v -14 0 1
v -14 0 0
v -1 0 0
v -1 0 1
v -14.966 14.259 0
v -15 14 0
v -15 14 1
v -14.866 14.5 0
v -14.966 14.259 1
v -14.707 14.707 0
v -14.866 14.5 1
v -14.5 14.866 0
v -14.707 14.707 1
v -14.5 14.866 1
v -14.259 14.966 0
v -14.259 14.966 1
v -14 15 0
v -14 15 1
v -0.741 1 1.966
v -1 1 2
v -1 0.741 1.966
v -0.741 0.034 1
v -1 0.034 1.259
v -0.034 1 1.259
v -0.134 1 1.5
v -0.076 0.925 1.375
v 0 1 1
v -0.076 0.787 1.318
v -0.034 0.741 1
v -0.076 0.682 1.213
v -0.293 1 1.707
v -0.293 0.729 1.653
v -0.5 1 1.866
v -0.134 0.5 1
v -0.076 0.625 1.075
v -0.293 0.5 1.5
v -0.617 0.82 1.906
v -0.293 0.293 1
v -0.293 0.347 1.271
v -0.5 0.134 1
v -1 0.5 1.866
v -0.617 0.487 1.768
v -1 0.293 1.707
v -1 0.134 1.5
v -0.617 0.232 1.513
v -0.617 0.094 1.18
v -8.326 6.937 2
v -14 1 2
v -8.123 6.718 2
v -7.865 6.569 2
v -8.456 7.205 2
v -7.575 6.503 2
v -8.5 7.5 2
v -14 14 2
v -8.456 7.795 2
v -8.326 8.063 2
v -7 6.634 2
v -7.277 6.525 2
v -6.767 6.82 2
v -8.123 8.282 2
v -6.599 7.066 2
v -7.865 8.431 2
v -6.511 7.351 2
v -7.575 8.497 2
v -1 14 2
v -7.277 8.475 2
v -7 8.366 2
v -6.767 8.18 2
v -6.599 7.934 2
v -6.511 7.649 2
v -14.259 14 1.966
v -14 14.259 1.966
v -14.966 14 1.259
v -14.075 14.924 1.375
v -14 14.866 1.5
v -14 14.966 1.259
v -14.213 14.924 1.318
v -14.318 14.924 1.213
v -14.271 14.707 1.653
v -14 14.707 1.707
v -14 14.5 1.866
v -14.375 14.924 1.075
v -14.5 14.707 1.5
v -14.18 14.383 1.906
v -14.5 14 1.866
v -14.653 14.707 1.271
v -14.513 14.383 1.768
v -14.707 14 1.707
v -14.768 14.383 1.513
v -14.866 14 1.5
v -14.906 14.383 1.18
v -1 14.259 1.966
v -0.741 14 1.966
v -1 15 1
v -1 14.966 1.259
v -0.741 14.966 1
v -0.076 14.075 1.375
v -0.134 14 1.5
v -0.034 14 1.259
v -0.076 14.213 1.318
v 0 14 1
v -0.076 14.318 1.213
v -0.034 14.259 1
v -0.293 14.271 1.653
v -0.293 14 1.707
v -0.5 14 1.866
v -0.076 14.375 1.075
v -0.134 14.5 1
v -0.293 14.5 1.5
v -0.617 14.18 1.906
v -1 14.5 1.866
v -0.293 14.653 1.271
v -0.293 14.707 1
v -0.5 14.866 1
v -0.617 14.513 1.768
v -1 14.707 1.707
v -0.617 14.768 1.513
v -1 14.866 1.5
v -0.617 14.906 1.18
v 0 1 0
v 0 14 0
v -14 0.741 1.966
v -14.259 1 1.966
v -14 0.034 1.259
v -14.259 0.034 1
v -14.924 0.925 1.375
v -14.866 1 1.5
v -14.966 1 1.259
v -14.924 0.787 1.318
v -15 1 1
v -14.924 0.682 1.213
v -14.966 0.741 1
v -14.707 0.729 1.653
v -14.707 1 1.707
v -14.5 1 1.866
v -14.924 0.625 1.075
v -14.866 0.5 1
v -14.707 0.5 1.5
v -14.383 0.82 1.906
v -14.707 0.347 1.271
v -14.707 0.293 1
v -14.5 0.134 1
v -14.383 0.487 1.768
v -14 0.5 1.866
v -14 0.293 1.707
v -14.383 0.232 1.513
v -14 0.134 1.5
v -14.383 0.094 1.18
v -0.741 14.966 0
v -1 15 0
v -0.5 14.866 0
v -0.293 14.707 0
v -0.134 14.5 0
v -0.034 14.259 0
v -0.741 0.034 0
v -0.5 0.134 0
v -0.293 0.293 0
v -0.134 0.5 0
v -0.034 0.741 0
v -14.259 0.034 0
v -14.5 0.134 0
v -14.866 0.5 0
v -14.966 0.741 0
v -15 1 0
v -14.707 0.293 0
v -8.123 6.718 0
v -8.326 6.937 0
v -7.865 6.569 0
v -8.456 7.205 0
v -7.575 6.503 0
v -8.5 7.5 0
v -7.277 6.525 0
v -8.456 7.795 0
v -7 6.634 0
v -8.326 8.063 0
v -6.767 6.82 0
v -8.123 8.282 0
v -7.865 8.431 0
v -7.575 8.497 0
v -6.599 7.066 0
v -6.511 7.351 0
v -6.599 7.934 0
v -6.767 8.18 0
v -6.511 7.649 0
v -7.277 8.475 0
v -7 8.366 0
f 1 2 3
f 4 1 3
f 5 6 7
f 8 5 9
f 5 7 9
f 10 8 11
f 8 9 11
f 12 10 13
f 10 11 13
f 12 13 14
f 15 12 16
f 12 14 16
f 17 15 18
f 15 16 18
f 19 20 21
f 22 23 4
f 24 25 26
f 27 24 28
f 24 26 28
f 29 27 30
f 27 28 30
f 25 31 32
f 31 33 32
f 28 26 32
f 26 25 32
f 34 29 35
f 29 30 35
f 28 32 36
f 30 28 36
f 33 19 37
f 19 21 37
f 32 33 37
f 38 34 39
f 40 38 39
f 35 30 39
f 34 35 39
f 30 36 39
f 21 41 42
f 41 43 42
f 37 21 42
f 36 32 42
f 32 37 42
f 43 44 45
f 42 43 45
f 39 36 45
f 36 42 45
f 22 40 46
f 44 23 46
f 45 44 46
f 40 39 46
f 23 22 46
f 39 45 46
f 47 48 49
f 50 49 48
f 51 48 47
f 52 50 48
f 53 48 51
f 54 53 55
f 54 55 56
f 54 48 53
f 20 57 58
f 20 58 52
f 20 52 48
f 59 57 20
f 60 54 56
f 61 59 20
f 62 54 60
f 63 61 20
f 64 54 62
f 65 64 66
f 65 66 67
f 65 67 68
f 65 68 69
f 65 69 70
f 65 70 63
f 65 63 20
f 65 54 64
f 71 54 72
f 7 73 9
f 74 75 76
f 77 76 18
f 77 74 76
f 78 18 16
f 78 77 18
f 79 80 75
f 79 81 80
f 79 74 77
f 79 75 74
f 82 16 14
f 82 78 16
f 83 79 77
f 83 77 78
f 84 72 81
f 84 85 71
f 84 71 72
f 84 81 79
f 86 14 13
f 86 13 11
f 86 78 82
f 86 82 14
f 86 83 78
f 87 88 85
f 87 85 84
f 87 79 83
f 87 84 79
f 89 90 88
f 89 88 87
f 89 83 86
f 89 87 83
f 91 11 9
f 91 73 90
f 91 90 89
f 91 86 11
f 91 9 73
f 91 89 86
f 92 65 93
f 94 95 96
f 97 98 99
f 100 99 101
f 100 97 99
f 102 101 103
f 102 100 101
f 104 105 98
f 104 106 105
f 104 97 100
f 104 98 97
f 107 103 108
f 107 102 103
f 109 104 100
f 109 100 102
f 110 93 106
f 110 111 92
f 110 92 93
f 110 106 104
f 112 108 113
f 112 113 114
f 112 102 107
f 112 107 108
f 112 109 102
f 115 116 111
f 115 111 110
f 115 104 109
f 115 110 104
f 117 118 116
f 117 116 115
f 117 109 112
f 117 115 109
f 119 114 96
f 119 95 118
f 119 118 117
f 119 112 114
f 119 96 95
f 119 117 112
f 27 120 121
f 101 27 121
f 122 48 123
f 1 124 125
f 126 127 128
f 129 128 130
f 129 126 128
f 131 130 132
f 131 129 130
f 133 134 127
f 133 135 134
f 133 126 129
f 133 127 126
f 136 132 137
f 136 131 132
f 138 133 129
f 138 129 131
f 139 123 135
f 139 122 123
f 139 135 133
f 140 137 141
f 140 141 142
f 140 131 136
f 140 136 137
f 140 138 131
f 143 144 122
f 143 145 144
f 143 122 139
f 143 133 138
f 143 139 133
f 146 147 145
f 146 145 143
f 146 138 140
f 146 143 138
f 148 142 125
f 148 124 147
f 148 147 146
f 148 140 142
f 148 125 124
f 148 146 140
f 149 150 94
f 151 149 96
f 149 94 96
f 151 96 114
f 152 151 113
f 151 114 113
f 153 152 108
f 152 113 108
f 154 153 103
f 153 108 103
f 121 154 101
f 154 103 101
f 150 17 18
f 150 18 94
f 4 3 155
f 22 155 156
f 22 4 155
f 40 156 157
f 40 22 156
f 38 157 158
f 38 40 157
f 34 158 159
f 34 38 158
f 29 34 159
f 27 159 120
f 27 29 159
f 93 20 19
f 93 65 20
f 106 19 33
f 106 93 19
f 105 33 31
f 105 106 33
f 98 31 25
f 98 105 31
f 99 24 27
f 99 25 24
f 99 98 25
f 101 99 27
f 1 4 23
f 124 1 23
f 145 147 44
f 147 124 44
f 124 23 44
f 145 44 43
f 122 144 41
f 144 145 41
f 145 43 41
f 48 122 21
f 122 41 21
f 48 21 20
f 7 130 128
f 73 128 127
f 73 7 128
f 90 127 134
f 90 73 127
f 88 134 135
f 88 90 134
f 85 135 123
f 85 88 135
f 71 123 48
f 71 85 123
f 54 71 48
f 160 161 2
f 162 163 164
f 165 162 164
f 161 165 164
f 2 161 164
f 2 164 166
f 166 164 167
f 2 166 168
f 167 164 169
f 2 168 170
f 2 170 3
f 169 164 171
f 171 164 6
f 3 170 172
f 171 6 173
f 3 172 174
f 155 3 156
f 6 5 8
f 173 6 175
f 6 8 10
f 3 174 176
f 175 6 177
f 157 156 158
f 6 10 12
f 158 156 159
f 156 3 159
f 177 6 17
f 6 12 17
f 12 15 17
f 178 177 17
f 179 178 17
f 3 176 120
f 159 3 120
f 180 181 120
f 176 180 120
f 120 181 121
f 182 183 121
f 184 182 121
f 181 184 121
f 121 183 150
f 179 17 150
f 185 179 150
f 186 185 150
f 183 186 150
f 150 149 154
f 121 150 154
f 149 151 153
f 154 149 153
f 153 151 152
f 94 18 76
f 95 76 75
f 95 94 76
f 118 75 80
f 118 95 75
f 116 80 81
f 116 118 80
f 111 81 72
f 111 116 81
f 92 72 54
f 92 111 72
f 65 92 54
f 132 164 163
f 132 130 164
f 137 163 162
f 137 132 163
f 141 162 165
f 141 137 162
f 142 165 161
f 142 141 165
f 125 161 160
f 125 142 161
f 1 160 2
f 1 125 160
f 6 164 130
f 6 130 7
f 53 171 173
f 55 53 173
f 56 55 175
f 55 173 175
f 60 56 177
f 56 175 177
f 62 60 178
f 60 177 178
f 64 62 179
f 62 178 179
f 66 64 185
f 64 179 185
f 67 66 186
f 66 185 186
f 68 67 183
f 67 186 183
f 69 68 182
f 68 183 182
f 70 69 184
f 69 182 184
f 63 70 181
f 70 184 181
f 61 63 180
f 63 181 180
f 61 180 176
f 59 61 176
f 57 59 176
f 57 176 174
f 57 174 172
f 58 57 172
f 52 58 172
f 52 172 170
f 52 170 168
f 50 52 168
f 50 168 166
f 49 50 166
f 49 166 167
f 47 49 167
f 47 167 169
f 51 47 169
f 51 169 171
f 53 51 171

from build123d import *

# Parameters (mm, degrees)
F0_W     = 15
F0_H     = 15
F1_DEPTH = 2
F3_D     = 2
F4_R     = 1


with BuildPart() as f1:
    # F0 (on Top) → F1 (new body)
    with BuildSketch(Plane.XY):
        with Locations((-7.5, 7.5)):
            Rectangle(F0_W, F0_H)
    extrude(amount=F1_DEPTH)

    # F3 (through all)
    with Locations(Plane.XY.offset(2)):
        with Locations((-7.5, 7.5)):
            Hole(F3_D / 2)

    # F4
    f4_edges = [f1.edges().sort_by_distance(p)[0] for p in [
        (-7.5, 0, 2),
        (-15, 7.5, 2),
        (-7.5, 15, 2),
        (0, 7.5, 2),
        (0, 0, 1),
        (-15, 0, 1),
        (0, 15, 1),
        (-15, 15, 1),
    ]]
    fillet(f4_edges, radius=F4_R)


solid = f1.part
